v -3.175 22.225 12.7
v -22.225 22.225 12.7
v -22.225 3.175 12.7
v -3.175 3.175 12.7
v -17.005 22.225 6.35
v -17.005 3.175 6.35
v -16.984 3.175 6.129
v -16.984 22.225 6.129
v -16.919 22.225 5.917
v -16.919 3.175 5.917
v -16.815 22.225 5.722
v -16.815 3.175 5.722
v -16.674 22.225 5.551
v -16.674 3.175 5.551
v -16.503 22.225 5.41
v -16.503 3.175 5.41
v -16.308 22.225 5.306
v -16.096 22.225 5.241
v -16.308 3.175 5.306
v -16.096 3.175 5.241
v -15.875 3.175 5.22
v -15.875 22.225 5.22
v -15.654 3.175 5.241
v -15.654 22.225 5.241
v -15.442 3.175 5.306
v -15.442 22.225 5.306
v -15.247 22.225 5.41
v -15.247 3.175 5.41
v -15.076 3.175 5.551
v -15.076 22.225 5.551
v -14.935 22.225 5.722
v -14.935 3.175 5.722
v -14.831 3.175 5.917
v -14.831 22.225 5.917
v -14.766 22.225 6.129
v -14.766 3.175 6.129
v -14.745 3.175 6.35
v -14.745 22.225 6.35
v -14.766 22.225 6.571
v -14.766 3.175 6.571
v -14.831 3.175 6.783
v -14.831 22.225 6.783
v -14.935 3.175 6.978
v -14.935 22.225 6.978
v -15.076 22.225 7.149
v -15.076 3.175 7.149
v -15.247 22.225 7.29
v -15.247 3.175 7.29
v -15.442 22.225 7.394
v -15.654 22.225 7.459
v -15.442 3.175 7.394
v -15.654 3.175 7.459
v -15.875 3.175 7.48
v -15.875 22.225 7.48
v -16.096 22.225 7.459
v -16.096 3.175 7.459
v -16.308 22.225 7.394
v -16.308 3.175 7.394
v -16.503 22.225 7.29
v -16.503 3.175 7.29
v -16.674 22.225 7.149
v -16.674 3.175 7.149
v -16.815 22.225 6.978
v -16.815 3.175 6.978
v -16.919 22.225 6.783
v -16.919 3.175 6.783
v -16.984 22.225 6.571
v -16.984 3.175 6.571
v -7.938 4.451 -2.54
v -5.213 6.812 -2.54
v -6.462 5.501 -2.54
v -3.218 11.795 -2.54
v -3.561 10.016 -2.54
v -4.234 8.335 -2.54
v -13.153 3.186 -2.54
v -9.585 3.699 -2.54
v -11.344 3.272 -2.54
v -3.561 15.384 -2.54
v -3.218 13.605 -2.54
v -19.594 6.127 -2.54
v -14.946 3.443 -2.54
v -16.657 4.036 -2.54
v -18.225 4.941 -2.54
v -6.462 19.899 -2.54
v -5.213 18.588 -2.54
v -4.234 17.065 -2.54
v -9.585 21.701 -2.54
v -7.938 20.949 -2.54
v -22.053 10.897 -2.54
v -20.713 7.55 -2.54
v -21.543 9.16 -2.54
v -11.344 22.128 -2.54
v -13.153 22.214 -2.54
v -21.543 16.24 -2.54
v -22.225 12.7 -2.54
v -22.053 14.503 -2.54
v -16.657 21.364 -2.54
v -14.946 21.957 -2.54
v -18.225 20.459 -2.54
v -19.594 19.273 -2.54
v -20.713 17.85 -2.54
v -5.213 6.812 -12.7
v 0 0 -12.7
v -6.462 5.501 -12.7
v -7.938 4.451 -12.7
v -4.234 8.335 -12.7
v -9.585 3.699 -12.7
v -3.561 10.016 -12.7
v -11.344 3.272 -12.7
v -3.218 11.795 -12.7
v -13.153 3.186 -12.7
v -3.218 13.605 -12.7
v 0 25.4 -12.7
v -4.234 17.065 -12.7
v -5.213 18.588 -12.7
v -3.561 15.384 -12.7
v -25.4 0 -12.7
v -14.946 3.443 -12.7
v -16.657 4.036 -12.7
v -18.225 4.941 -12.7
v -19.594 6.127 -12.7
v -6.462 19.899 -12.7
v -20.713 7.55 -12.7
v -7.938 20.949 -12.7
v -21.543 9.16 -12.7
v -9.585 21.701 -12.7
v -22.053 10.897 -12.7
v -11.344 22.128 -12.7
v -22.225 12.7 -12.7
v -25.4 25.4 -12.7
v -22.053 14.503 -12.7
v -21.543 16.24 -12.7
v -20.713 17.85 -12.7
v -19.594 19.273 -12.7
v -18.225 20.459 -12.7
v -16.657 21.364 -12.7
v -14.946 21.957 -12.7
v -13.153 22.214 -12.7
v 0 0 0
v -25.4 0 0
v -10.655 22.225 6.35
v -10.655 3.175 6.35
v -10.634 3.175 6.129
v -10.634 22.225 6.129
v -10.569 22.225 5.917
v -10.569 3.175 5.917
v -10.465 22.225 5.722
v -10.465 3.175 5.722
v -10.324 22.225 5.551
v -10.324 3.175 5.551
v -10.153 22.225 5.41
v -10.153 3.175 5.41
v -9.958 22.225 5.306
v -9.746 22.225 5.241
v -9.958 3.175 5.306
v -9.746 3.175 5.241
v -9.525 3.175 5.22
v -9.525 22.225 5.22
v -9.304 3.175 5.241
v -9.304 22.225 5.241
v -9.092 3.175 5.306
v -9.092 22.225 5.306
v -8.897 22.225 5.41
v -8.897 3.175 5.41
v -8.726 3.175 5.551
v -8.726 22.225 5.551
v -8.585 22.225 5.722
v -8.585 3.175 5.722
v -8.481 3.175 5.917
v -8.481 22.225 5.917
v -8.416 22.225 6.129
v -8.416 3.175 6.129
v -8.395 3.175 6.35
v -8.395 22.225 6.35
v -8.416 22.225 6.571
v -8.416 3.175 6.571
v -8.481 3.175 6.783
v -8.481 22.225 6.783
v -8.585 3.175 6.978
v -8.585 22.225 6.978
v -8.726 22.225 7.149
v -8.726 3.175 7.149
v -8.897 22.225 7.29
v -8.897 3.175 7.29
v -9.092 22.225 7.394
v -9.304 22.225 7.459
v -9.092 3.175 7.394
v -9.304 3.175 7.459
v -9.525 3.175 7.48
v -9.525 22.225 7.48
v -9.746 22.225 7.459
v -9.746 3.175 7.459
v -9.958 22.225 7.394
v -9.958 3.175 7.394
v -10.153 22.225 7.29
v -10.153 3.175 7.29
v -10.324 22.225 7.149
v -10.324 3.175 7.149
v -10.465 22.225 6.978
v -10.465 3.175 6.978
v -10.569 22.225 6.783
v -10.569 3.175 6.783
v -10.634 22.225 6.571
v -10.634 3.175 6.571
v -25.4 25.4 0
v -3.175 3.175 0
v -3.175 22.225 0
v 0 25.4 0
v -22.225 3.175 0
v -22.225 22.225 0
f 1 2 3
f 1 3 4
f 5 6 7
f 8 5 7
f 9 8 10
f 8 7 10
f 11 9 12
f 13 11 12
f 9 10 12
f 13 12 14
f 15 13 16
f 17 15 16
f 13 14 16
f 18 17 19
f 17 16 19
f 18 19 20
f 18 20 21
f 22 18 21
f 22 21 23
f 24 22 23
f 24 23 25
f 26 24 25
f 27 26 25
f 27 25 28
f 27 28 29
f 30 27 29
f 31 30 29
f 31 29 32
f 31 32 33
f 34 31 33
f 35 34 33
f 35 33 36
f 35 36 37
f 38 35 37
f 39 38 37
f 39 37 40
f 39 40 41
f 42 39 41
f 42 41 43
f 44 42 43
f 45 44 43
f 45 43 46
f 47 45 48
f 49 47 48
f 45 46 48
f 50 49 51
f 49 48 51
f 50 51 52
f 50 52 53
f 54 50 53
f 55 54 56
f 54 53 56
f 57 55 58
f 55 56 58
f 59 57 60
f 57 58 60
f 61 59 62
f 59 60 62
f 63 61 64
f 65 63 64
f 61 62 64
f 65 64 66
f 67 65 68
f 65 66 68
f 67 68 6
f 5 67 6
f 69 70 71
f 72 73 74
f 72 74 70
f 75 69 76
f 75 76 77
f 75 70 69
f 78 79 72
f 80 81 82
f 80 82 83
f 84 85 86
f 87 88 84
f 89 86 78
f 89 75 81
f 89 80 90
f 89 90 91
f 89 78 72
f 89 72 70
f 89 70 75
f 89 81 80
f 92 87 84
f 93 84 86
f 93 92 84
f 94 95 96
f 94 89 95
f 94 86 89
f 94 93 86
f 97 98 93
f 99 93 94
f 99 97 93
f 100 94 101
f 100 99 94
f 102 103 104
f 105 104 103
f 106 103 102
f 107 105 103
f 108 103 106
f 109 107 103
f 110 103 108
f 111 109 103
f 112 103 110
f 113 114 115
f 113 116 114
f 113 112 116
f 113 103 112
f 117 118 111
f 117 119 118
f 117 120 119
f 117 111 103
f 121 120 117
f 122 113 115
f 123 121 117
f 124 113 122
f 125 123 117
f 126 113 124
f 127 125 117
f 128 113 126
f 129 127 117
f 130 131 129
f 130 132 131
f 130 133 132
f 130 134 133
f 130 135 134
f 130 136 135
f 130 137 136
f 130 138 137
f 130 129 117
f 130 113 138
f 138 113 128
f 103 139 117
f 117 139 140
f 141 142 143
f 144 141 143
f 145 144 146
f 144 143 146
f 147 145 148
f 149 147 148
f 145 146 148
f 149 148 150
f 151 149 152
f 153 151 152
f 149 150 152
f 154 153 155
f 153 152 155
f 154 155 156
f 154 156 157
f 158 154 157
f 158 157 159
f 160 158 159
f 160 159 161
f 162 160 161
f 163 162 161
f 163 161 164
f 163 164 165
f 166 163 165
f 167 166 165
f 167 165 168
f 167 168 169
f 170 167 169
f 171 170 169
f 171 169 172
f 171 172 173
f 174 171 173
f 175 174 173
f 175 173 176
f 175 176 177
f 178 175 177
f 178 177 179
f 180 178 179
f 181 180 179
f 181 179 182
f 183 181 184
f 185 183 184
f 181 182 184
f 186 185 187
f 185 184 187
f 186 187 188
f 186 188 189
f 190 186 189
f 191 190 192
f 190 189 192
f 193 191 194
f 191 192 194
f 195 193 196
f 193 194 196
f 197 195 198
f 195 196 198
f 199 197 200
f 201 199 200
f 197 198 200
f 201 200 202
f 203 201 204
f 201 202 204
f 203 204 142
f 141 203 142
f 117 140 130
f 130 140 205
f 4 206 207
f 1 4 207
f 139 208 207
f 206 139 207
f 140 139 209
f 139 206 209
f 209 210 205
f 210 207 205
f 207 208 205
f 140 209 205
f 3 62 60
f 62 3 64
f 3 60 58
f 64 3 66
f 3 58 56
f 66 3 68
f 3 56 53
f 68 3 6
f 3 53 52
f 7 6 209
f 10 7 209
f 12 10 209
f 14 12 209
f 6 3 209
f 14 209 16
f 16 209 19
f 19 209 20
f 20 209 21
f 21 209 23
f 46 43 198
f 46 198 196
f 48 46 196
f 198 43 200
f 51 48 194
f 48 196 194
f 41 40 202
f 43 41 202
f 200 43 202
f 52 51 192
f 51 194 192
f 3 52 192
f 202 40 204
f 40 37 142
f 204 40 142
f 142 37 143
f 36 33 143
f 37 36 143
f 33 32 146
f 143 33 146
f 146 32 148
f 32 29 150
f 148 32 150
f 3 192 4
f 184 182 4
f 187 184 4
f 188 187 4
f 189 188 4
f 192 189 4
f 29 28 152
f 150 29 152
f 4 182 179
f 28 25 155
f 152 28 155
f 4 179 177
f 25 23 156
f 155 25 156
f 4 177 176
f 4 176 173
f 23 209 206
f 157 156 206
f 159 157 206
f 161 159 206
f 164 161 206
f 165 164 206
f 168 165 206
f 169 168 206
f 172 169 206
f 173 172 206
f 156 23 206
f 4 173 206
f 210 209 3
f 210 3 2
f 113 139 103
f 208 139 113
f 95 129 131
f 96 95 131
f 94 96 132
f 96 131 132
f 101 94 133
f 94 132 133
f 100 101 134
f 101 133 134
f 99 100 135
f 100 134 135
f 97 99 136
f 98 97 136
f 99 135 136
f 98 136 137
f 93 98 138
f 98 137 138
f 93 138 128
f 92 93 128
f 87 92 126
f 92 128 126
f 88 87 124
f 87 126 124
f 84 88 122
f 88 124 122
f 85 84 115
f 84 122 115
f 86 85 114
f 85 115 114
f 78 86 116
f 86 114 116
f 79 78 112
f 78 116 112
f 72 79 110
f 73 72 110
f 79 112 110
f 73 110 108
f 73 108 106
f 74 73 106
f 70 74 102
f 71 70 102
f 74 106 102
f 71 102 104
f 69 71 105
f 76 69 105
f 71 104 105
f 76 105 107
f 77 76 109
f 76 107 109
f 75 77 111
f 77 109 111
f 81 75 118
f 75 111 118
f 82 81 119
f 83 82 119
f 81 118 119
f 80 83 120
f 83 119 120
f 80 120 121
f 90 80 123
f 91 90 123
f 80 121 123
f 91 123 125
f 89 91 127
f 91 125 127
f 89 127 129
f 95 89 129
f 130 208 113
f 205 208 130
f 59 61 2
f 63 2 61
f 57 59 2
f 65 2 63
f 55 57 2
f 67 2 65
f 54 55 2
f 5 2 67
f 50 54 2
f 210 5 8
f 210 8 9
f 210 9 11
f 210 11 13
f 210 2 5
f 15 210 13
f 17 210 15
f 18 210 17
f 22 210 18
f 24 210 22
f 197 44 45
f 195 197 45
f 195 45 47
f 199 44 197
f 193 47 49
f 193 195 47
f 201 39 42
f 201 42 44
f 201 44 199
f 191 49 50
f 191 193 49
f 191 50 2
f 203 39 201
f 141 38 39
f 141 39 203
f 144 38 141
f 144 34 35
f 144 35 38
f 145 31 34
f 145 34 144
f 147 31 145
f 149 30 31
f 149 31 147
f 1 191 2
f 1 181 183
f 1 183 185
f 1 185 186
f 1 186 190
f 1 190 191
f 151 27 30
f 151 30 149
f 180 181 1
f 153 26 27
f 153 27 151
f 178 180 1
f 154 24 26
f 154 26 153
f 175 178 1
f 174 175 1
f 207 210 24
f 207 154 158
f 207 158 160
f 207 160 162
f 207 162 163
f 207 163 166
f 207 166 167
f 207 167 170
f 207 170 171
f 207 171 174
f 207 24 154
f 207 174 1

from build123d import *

# Parameters (mm, degrees)
SKETCH1_W                 = 19.05
SKETCH1_H                 = 19.05
BOSS_EXTRUDE1_DEPTH       = 12.7
SKETCH2_W                 = 25.4
SKETCH2_H                 = 25.4
BOSS_EXTRUDE2_DEPTH       = 12.7
SKETCH3_R                 = 9.525
CUT_EXTRUDE3_DEPTH        = 10.16
TAP_DRILL_FOR_4_40_TAP1_D = 2.2606


with BuildPart() as part:
    # Sketch1 → Boss-Extrude1 (new body)
    with BuildSketch(Plane.XY):
        with Locations((-12.7, 12.7)):
            Rectangle(SKETCH1_W, SKETCH1_H)
    extrude(amount=BOSS_EXTRUDE1_DEPTH)

    # Sketch2 → Boss-Extrude2 (add)
    with BuildSketch(Plane(origin=(0, 0, 0), x_dir=(-1, 0, 0), z_dir=(0, 0, -1))):
        with Locations((12.7, 12.7)):
            Rectangle(SKETCH2_W, SKETCH2_H)
    extrude(amount=BOSS_EXTRUDE2_DEPTH)

    # Sketch3 → Cut-Extrude3 (cut)
    with BuildSketch(Plane(origin=(0, 0, -12.7), x_dir=(-1, 0, 0), z_dir=(0, 0, -1))):
        with Locations((12.7, 12.7)):
            Circle(SKETCH3_R)
    extrude(amount=-CUT_EXTRUDE3_DEPTH, mode=Mode.SUBTRACT)

    # Tap Drill for #4-40 Tap1 (through all)
    with Locations(Plane(origin=(0, 22.225, 0), x_dir=(1, 0, 0), z_dir=(0, 1, 0))):
        with Locations((-9.525, -6.35), (-15.875, -6.35)):
            Hole(TAP_DRILL_FOR_4_40_TAP1_D / 2)


solid = part.part
